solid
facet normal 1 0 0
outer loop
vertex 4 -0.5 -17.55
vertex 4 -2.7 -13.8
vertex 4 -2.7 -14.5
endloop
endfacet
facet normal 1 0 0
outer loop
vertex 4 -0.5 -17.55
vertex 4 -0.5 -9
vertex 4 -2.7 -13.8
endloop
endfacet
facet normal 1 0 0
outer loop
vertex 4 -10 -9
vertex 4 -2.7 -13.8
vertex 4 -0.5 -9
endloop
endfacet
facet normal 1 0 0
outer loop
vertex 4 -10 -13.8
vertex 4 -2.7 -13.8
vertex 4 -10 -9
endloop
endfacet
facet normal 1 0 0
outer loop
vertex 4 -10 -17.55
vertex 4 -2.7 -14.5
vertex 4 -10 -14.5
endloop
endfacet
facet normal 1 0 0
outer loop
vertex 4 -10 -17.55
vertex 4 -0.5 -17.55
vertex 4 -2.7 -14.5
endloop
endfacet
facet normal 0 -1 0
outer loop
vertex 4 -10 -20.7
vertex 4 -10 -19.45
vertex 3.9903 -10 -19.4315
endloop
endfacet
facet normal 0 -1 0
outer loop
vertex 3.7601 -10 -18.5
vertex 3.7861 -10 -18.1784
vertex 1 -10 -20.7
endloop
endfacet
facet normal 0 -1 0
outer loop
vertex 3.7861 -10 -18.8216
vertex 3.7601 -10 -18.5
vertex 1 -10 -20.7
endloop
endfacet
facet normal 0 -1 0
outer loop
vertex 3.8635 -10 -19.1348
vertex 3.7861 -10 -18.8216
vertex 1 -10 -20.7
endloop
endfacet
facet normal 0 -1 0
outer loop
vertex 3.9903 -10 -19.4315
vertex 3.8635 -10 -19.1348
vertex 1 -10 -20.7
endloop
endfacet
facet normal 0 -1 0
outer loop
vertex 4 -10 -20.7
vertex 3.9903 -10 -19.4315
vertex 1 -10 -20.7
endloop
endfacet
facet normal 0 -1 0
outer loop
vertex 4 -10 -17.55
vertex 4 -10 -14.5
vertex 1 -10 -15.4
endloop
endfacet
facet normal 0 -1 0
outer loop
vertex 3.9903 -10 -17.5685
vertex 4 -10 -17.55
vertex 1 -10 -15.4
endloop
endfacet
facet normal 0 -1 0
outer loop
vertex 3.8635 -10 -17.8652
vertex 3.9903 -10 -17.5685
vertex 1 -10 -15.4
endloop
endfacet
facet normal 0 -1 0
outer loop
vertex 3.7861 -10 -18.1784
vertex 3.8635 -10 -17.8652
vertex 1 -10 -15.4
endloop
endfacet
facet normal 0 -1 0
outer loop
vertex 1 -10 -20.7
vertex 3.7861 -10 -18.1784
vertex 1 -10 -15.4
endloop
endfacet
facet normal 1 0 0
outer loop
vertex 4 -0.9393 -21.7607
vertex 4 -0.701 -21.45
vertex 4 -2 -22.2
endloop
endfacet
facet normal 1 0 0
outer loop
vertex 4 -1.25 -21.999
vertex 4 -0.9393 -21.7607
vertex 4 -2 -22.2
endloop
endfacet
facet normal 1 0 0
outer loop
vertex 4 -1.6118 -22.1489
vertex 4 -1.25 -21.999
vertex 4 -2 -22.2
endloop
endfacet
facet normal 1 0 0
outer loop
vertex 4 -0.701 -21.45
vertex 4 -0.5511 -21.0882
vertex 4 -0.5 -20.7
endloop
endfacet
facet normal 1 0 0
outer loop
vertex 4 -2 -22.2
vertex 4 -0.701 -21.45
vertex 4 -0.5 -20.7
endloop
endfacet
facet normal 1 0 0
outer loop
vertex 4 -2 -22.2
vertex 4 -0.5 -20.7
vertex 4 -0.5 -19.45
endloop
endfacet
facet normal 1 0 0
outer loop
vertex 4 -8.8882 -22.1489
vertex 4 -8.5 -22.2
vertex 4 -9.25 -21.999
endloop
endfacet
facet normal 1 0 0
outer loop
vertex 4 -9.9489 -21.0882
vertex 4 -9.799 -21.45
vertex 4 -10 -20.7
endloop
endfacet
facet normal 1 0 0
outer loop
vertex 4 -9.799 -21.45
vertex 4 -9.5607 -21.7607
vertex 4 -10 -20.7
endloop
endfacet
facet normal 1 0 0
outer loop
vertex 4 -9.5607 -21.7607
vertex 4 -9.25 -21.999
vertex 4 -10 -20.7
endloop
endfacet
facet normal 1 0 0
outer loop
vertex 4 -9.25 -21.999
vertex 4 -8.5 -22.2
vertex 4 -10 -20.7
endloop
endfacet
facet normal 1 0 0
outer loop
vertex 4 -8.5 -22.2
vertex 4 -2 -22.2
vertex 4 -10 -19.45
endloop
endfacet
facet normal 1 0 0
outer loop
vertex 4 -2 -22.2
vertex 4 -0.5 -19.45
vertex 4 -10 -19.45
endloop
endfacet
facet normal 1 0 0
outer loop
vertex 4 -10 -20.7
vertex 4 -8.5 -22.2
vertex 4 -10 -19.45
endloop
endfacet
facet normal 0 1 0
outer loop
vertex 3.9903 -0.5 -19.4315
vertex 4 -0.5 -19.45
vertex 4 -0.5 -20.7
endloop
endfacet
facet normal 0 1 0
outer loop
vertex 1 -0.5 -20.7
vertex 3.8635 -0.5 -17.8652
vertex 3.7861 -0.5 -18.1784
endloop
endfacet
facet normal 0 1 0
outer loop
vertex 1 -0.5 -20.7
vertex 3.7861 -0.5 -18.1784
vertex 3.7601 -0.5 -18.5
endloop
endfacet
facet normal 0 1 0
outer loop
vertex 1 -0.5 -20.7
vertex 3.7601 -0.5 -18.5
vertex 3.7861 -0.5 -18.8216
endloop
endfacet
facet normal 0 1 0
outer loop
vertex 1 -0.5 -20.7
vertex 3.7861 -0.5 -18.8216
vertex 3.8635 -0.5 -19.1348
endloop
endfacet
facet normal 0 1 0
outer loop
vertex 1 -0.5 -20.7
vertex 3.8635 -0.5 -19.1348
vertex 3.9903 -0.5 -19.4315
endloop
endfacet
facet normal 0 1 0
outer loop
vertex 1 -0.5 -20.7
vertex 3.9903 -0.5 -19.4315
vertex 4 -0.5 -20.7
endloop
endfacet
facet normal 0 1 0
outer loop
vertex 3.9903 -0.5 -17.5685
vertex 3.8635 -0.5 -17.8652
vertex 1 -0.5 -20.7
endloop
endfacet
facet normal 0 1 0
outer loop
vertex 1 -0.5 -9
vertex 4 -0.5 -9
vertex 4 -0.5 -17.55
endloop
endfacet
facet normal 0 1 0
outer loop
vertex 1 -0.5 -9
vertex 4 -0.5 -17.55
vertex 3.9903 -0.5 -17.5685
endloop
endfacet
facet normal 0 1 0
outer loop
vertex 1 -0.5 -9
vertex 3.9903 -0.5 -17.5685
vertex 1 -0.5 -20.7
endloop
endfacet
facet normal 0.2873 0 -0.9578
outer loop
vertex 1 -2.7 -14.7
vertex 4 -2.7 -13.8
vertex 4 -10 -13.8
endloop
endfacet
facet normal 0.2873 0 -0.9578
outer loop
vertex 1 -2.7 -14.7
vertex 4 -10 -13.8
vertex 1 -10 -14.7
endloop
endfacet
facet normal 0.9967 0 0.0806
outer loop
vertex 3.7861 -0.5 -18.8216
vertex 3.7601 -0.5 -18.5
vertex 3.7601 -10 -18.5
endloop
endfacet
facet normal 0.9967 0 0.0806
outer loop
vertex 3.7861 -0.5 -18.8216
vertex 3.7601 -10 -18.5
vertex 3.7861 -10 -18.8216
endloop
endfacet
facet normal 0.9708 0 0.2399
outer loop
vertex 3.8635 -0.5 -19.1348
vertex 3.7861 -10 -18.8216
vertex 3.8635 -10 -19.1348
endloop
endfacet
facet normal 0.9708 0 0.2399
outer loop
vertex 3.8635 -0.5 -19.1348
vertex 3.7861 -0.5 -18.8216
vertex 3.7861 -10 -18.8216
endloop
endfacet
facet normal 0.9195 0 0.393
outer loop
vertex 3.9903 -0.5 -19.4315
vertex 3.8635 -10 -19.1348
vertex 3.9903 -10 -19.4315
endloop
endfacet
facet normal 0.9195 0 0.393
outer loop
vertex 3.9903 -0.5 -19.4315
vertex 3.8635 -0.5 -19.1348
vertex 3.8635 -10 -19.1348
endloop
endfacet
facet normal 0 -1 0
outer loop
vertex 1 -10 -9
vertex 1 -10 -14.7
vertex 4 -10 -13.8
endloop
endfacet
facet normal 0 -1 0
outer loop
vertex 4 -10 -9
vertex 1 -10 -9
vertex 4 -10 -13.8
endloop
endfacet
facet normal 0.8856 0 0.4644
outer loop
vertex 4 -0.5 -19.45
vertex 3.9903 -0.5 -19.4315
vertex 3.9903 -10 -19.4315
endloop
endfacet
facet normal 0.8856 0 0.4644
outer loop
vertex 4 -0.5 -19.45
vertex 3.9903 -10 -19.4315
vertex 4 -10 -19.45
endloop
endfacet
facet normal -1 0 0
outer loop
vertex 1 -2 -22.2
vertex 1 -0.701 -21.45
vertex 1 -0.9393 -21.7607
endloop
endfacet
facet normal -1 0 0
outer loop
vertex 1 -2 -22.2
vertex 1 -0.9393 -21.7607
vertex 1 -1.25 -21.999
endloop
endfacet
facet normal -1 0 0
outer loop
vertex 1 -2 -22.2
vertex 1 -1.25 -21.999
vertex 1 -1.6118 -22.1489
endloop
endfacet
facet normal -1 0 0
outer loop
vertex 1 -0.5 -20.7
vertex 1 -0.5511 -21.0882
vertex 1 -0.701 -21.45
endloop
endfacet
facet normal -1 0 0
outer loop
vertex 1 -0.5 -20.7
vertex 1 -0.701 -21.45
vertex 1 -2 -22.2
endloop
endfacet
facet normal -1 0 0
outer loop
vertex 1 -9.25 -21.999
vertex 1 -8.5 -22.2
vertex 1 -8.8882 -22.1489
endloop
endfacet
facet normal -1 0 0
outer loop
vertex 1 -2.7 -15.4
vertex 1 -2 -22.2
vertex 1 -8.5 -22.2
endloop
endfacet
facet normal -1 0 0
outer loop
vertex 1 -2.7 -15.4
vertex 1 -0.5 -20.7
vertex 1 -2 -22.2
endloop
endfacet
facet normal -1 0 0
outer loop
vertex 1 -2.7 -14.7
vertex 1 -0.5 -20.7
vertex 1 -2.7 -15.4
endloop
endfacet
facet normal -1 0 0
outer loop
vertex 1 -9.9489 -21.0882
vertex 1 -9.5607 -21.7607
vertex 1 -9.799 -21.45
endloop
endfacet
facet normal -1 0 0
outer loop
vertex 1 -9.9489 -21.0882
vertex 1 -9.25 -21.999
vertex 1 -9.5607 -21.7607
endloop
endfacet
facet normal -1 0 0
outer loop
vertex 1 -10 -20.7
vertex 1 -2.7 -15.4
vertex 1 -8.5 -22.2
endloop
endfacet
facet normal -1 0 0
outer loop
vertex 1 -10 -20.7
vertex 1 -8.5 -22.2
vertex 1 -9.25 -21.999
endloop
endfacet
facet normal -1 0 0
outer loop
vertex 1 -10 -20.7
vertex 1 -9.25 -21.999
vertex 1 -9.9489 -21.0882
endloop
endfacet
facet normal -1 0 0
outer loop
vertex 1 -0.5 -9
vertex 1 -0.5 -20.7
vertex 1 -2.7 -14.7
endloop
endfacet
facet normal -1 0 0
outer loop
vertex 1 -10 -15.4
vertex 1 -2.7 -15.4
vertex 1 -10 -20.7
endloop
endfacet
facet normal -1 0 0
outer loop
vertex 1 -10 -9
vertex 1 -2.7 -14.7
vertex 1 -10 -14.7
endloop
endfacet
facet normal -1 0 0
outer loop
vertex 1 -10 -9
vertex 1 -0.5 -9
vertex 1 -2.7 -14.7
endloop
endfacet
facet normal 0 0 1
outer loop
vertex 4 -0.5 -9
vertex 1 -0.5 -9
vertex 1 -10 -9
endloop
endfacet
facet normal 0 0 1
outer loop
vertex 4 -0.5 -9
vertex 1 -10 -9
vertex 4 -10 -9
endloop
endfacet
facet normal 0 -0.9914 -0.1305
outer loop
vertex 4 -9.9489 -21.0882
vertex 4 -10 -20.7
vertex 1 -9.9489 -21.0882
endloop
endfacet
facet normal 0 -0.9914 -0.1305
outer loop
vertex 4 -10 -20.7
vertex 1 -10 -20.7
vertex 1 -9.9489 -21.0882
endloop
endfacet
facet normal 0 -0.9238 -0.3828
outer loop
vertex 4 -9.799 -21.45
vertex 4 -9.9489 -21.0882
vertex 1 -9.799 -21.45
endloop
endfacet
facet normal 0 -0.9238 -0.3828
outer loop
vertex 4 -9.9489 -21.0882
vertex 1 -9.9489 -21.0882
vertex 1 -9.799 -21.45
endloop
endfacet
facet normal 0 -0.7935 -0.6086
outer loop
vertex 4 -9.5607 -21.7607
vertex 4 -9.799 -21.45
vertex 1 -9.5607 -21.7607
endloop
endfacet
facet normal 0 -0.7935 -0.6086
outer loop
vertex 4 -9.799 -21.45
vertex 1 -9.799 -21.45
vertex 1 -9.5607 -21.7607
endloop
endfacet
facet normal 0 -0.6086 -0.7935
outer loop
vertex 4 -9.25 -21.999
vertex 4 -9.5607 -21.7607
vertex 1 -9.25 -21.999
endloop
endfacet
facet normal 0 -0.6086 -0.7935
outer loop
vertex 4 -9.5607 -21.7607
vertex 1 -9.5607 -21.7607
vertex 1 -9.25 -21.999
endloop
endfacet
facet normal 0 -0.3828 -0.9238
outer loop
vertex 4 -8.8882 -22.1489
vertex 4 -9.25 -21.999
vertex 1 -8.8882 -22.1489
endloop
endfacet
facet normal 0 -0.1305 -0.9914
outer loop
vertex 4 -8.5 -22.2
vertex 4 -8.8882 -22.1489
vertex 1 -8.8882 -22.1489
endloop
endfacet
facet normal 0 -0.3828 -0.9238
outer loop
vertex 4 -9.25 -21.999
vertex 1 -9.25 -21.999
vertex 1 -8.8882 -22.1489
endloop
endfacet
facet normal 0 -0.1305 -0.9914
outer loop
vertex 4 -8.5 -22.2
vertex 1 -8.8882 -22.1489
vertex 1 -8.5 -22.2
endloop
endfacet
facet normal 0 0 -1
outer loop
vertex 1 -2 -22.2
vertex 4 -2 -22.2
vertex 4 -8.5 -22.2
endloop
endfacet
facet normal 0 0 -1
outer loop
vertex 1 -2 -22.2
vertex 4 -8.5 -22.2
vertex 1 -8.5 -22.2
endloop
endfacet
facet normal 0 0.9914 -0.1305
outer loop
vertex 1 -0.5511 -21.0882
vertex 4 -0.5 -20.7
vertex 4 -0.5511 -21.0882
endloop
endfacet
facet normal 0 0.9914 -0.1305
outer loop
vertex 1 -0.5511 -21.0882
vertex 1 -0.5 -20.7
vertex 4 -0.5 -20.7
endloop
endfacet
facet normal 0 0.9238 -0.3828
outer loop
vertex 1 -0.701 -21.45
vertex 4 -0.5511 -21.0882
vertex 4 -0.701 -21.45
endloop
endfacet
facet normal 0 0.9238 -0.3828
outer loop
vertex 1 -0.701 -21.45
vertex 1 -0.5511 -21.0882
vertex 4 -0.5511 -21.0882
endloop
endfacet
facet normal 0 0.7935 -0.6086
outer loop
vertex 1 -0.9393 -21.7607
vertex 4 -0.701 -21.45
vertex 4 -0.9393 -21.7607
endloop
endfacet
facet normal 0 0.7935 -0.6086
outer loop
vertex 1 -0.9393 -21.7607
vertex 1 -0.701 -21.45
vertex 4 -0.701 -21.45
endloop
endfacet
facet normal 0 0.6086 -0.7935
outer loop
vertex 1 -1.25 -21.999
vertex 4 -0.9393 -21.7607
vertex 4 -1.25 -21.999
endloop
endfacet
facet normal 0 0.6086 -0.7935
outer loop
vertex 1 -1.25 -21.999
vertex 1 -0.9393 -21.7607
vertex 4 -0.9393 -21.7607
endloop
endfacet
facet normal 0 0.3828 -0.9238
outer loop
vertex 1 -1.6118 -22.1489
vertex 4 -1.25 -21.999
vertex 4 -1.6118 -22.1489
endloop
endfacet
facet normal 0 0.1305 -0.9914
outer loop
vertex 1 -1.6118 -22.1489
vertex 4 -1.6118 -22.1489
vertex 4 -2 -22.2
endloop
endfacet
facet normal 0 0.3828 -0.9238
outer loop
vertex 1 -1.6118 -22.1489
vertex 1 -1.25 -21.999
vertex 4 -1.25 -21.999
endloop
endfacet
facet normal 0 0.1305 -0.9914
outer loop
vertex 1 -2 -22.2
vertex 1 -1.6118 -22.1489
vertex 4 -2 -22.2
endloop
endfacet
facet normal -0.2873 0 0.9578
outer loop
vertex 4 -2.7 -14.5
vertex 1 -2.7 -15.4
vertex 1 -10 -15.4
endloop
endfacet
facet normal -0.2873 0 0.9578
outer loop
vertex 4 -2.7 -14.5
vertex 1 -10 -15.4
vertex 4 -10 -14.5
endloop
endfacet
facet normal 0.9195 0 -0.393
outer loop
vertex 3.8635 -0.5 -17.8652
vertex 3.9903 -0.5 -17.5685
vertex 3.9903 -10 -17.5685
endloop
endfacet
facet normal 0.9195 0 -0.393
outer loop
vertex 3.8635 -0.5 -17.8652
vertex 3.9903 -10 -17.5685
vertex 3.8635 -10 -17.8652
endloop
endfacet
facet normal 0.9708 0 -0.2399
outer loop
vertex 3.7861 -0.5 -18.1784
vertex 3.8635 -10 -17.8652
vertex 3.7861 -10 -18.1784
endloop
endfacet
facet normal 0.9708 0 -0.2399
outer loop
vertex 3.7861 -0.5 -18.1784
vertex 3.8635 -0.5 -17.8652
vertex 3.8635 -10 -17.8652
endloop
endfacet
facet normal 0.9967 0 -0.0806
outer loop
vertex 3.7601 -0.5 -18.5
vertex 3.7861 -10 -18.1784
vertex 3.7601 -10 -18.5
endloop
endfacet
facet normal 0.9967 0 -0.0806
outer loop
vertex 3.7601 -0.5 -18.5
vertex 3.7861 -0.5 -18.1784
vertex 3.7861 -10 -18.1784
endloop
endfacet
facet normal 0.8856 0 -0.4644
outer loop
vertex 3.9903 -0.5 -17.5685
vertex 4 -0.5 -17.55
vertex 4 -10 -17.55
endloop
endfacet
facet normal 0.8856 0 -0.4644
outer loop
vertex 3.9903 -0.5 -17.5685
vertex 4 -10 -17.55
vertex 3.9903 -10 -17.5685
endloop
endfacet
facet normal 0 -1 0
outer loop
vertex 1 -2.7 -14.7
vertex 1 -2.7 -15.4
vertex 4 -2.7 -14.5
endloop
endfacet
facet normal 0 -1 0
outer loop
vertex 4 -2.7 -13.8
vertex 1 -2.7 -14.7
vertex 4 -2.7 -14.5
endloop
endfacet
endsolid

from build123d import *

# Parameters (mm, degrees)
F0_W      = 1
F0_H      = 2.5
F0_H_2    = 1.5
F1_DEPTH  = 10
F3_W      = 4
F3_H      = 2.7
F3_W_2    = 1
F4_DEPTH  = 7
F6_DEPTH  = 7.3
F7_DEPTH  = 1
F8_DEPTH  = 0.5
F9_DEPTH  = 0.5
F10_DEPTH = 0.5
F11_W     = 2
F11_H     = 14.978
F12_DEPTH = 25
F13_DEPTH = 1.2
F14_R     = 1.5


with BuildPart() as f1:
    # F0 (on Front) → F1 (new body)
    with BuildSketch(Plane.XZ):
        with BuildLine():
            Line((0, 2.5), (0, 0))
            Line((0, 0), (4, 0))
            Line((4, 0), (4, 1.55))
            Line((4, 1.55), (3.990259403, 1.5685071343))
            ThreePointArc((3.990259403, 1.5685071343), (3.8184891819, 2.0202463599), (3.7600958477, 2.5))
            ThreePointArc((3.7600958477, 2.5), (3.8184891819, 2.9797536401), (3.990259403, 3.4314928657))
            Line((3.990259403, 3.4314928657), (4, 3.45))
            Line((4, 3.45), (4, 4))
            Line((4, 4), (0, 4))
            Line((0, 4), (0, 2.5))
        make_face()
        with Locations((-0.5, 1.25)):
            Rectangle(F0_W, F0_H)
        Polygon((4, 0), (0, 0), (-1, 0), (4, -1.5), align=None)
        with Locations((-0.5, 3.25)):
            Rectangle(F0_W, F0_H_2)
    extrude(amount=F1_DEPTH)

    # F3 (on offset) → F4 (join)
    with BuildSketch(Plane.XY.offset(1)):
        with Locations((2, -1.35)):
            Rectangle(F3_W, F3_H)
        with Locations((-0.5, -1.35)):
            Rectangle(F3_W_2, F3_H)
    extrude(amount=-F4_DEPTH)

    # F5 (on face) → F6 (join, through all)
    with BuildSketch(Plane.XZ.offset(2.7)):
        Polygon((-1, -6), (4, -6), (4, -2.2), (-1, -0.7), align=None)
    extrude(amount=F6_DEPTH)

    # F7 (add): a face of the model
    f7_faces = [f1.faces().sort_by_distance(p)[0] for p in [
        (1.5, -5, -6),
    ]]
    extrude(f7_faces, amount=F7_DEPTH)

    # F8 (add): a face of the model
    f8_faces = [f1.faces().sort_by_distance(p)[0] for p in [
        (1.5, -5, 4),
    ]]
    extrude(f8_faces, amount=F8_DEPTH)

    # F9 (cut): a face of the model
    f9_faces = [f1.faces().sort_by_distance(p)[0] for p in [
        (1.4870709663, 0, -1.2701719647),
    ]]
    extrude(f9_faces, amount=-F9_DEPTH, mode=Mode.SUBTRACT)

    # F10 (add): a face of the model
    f10_faces = [f1.faces().sort_by_distance(p)[0] for p in [
        (1.5, -5.25, 4.5),
    ]]
    extrude(f10_faces, amount=F10_DEPTH)

    # F11 (on face) → F12 (cut)
    with BuildSketch(Plane.XZ.offset(10)):
        with Locations((0, -0.511)):
            Rectangle(F11_W, F11_H)
    extrude(amount=-F12_DEPTH, mode=Mode.SUBTRACT)

    # F13 (add): a face of the model
    f13_faces = [f1.faces().sort_by_distance(p)[0] for p in [
        (2.5, -5.25, 5),
    ]]
    extrude(f13_faces, amount=F13_DEPTH)

    # F14
    f14_edges = [f1.edges().sort_by_distance(p)[0] for p in [
        (2.5, -10, 6.2),
        (2.5, -0.5, 6.2),
    ]]
    fillet(f14_edges, radius=F14_R)


with BuildPart() as f16_1:
    # F16: instance of F1
    add(f1.part.mirror(Plane(origin=(2.5, -5.25, -8), x_dir=(1, 0, 0), z_dir=(0, 0, -1))))


solid = f16_1.part
